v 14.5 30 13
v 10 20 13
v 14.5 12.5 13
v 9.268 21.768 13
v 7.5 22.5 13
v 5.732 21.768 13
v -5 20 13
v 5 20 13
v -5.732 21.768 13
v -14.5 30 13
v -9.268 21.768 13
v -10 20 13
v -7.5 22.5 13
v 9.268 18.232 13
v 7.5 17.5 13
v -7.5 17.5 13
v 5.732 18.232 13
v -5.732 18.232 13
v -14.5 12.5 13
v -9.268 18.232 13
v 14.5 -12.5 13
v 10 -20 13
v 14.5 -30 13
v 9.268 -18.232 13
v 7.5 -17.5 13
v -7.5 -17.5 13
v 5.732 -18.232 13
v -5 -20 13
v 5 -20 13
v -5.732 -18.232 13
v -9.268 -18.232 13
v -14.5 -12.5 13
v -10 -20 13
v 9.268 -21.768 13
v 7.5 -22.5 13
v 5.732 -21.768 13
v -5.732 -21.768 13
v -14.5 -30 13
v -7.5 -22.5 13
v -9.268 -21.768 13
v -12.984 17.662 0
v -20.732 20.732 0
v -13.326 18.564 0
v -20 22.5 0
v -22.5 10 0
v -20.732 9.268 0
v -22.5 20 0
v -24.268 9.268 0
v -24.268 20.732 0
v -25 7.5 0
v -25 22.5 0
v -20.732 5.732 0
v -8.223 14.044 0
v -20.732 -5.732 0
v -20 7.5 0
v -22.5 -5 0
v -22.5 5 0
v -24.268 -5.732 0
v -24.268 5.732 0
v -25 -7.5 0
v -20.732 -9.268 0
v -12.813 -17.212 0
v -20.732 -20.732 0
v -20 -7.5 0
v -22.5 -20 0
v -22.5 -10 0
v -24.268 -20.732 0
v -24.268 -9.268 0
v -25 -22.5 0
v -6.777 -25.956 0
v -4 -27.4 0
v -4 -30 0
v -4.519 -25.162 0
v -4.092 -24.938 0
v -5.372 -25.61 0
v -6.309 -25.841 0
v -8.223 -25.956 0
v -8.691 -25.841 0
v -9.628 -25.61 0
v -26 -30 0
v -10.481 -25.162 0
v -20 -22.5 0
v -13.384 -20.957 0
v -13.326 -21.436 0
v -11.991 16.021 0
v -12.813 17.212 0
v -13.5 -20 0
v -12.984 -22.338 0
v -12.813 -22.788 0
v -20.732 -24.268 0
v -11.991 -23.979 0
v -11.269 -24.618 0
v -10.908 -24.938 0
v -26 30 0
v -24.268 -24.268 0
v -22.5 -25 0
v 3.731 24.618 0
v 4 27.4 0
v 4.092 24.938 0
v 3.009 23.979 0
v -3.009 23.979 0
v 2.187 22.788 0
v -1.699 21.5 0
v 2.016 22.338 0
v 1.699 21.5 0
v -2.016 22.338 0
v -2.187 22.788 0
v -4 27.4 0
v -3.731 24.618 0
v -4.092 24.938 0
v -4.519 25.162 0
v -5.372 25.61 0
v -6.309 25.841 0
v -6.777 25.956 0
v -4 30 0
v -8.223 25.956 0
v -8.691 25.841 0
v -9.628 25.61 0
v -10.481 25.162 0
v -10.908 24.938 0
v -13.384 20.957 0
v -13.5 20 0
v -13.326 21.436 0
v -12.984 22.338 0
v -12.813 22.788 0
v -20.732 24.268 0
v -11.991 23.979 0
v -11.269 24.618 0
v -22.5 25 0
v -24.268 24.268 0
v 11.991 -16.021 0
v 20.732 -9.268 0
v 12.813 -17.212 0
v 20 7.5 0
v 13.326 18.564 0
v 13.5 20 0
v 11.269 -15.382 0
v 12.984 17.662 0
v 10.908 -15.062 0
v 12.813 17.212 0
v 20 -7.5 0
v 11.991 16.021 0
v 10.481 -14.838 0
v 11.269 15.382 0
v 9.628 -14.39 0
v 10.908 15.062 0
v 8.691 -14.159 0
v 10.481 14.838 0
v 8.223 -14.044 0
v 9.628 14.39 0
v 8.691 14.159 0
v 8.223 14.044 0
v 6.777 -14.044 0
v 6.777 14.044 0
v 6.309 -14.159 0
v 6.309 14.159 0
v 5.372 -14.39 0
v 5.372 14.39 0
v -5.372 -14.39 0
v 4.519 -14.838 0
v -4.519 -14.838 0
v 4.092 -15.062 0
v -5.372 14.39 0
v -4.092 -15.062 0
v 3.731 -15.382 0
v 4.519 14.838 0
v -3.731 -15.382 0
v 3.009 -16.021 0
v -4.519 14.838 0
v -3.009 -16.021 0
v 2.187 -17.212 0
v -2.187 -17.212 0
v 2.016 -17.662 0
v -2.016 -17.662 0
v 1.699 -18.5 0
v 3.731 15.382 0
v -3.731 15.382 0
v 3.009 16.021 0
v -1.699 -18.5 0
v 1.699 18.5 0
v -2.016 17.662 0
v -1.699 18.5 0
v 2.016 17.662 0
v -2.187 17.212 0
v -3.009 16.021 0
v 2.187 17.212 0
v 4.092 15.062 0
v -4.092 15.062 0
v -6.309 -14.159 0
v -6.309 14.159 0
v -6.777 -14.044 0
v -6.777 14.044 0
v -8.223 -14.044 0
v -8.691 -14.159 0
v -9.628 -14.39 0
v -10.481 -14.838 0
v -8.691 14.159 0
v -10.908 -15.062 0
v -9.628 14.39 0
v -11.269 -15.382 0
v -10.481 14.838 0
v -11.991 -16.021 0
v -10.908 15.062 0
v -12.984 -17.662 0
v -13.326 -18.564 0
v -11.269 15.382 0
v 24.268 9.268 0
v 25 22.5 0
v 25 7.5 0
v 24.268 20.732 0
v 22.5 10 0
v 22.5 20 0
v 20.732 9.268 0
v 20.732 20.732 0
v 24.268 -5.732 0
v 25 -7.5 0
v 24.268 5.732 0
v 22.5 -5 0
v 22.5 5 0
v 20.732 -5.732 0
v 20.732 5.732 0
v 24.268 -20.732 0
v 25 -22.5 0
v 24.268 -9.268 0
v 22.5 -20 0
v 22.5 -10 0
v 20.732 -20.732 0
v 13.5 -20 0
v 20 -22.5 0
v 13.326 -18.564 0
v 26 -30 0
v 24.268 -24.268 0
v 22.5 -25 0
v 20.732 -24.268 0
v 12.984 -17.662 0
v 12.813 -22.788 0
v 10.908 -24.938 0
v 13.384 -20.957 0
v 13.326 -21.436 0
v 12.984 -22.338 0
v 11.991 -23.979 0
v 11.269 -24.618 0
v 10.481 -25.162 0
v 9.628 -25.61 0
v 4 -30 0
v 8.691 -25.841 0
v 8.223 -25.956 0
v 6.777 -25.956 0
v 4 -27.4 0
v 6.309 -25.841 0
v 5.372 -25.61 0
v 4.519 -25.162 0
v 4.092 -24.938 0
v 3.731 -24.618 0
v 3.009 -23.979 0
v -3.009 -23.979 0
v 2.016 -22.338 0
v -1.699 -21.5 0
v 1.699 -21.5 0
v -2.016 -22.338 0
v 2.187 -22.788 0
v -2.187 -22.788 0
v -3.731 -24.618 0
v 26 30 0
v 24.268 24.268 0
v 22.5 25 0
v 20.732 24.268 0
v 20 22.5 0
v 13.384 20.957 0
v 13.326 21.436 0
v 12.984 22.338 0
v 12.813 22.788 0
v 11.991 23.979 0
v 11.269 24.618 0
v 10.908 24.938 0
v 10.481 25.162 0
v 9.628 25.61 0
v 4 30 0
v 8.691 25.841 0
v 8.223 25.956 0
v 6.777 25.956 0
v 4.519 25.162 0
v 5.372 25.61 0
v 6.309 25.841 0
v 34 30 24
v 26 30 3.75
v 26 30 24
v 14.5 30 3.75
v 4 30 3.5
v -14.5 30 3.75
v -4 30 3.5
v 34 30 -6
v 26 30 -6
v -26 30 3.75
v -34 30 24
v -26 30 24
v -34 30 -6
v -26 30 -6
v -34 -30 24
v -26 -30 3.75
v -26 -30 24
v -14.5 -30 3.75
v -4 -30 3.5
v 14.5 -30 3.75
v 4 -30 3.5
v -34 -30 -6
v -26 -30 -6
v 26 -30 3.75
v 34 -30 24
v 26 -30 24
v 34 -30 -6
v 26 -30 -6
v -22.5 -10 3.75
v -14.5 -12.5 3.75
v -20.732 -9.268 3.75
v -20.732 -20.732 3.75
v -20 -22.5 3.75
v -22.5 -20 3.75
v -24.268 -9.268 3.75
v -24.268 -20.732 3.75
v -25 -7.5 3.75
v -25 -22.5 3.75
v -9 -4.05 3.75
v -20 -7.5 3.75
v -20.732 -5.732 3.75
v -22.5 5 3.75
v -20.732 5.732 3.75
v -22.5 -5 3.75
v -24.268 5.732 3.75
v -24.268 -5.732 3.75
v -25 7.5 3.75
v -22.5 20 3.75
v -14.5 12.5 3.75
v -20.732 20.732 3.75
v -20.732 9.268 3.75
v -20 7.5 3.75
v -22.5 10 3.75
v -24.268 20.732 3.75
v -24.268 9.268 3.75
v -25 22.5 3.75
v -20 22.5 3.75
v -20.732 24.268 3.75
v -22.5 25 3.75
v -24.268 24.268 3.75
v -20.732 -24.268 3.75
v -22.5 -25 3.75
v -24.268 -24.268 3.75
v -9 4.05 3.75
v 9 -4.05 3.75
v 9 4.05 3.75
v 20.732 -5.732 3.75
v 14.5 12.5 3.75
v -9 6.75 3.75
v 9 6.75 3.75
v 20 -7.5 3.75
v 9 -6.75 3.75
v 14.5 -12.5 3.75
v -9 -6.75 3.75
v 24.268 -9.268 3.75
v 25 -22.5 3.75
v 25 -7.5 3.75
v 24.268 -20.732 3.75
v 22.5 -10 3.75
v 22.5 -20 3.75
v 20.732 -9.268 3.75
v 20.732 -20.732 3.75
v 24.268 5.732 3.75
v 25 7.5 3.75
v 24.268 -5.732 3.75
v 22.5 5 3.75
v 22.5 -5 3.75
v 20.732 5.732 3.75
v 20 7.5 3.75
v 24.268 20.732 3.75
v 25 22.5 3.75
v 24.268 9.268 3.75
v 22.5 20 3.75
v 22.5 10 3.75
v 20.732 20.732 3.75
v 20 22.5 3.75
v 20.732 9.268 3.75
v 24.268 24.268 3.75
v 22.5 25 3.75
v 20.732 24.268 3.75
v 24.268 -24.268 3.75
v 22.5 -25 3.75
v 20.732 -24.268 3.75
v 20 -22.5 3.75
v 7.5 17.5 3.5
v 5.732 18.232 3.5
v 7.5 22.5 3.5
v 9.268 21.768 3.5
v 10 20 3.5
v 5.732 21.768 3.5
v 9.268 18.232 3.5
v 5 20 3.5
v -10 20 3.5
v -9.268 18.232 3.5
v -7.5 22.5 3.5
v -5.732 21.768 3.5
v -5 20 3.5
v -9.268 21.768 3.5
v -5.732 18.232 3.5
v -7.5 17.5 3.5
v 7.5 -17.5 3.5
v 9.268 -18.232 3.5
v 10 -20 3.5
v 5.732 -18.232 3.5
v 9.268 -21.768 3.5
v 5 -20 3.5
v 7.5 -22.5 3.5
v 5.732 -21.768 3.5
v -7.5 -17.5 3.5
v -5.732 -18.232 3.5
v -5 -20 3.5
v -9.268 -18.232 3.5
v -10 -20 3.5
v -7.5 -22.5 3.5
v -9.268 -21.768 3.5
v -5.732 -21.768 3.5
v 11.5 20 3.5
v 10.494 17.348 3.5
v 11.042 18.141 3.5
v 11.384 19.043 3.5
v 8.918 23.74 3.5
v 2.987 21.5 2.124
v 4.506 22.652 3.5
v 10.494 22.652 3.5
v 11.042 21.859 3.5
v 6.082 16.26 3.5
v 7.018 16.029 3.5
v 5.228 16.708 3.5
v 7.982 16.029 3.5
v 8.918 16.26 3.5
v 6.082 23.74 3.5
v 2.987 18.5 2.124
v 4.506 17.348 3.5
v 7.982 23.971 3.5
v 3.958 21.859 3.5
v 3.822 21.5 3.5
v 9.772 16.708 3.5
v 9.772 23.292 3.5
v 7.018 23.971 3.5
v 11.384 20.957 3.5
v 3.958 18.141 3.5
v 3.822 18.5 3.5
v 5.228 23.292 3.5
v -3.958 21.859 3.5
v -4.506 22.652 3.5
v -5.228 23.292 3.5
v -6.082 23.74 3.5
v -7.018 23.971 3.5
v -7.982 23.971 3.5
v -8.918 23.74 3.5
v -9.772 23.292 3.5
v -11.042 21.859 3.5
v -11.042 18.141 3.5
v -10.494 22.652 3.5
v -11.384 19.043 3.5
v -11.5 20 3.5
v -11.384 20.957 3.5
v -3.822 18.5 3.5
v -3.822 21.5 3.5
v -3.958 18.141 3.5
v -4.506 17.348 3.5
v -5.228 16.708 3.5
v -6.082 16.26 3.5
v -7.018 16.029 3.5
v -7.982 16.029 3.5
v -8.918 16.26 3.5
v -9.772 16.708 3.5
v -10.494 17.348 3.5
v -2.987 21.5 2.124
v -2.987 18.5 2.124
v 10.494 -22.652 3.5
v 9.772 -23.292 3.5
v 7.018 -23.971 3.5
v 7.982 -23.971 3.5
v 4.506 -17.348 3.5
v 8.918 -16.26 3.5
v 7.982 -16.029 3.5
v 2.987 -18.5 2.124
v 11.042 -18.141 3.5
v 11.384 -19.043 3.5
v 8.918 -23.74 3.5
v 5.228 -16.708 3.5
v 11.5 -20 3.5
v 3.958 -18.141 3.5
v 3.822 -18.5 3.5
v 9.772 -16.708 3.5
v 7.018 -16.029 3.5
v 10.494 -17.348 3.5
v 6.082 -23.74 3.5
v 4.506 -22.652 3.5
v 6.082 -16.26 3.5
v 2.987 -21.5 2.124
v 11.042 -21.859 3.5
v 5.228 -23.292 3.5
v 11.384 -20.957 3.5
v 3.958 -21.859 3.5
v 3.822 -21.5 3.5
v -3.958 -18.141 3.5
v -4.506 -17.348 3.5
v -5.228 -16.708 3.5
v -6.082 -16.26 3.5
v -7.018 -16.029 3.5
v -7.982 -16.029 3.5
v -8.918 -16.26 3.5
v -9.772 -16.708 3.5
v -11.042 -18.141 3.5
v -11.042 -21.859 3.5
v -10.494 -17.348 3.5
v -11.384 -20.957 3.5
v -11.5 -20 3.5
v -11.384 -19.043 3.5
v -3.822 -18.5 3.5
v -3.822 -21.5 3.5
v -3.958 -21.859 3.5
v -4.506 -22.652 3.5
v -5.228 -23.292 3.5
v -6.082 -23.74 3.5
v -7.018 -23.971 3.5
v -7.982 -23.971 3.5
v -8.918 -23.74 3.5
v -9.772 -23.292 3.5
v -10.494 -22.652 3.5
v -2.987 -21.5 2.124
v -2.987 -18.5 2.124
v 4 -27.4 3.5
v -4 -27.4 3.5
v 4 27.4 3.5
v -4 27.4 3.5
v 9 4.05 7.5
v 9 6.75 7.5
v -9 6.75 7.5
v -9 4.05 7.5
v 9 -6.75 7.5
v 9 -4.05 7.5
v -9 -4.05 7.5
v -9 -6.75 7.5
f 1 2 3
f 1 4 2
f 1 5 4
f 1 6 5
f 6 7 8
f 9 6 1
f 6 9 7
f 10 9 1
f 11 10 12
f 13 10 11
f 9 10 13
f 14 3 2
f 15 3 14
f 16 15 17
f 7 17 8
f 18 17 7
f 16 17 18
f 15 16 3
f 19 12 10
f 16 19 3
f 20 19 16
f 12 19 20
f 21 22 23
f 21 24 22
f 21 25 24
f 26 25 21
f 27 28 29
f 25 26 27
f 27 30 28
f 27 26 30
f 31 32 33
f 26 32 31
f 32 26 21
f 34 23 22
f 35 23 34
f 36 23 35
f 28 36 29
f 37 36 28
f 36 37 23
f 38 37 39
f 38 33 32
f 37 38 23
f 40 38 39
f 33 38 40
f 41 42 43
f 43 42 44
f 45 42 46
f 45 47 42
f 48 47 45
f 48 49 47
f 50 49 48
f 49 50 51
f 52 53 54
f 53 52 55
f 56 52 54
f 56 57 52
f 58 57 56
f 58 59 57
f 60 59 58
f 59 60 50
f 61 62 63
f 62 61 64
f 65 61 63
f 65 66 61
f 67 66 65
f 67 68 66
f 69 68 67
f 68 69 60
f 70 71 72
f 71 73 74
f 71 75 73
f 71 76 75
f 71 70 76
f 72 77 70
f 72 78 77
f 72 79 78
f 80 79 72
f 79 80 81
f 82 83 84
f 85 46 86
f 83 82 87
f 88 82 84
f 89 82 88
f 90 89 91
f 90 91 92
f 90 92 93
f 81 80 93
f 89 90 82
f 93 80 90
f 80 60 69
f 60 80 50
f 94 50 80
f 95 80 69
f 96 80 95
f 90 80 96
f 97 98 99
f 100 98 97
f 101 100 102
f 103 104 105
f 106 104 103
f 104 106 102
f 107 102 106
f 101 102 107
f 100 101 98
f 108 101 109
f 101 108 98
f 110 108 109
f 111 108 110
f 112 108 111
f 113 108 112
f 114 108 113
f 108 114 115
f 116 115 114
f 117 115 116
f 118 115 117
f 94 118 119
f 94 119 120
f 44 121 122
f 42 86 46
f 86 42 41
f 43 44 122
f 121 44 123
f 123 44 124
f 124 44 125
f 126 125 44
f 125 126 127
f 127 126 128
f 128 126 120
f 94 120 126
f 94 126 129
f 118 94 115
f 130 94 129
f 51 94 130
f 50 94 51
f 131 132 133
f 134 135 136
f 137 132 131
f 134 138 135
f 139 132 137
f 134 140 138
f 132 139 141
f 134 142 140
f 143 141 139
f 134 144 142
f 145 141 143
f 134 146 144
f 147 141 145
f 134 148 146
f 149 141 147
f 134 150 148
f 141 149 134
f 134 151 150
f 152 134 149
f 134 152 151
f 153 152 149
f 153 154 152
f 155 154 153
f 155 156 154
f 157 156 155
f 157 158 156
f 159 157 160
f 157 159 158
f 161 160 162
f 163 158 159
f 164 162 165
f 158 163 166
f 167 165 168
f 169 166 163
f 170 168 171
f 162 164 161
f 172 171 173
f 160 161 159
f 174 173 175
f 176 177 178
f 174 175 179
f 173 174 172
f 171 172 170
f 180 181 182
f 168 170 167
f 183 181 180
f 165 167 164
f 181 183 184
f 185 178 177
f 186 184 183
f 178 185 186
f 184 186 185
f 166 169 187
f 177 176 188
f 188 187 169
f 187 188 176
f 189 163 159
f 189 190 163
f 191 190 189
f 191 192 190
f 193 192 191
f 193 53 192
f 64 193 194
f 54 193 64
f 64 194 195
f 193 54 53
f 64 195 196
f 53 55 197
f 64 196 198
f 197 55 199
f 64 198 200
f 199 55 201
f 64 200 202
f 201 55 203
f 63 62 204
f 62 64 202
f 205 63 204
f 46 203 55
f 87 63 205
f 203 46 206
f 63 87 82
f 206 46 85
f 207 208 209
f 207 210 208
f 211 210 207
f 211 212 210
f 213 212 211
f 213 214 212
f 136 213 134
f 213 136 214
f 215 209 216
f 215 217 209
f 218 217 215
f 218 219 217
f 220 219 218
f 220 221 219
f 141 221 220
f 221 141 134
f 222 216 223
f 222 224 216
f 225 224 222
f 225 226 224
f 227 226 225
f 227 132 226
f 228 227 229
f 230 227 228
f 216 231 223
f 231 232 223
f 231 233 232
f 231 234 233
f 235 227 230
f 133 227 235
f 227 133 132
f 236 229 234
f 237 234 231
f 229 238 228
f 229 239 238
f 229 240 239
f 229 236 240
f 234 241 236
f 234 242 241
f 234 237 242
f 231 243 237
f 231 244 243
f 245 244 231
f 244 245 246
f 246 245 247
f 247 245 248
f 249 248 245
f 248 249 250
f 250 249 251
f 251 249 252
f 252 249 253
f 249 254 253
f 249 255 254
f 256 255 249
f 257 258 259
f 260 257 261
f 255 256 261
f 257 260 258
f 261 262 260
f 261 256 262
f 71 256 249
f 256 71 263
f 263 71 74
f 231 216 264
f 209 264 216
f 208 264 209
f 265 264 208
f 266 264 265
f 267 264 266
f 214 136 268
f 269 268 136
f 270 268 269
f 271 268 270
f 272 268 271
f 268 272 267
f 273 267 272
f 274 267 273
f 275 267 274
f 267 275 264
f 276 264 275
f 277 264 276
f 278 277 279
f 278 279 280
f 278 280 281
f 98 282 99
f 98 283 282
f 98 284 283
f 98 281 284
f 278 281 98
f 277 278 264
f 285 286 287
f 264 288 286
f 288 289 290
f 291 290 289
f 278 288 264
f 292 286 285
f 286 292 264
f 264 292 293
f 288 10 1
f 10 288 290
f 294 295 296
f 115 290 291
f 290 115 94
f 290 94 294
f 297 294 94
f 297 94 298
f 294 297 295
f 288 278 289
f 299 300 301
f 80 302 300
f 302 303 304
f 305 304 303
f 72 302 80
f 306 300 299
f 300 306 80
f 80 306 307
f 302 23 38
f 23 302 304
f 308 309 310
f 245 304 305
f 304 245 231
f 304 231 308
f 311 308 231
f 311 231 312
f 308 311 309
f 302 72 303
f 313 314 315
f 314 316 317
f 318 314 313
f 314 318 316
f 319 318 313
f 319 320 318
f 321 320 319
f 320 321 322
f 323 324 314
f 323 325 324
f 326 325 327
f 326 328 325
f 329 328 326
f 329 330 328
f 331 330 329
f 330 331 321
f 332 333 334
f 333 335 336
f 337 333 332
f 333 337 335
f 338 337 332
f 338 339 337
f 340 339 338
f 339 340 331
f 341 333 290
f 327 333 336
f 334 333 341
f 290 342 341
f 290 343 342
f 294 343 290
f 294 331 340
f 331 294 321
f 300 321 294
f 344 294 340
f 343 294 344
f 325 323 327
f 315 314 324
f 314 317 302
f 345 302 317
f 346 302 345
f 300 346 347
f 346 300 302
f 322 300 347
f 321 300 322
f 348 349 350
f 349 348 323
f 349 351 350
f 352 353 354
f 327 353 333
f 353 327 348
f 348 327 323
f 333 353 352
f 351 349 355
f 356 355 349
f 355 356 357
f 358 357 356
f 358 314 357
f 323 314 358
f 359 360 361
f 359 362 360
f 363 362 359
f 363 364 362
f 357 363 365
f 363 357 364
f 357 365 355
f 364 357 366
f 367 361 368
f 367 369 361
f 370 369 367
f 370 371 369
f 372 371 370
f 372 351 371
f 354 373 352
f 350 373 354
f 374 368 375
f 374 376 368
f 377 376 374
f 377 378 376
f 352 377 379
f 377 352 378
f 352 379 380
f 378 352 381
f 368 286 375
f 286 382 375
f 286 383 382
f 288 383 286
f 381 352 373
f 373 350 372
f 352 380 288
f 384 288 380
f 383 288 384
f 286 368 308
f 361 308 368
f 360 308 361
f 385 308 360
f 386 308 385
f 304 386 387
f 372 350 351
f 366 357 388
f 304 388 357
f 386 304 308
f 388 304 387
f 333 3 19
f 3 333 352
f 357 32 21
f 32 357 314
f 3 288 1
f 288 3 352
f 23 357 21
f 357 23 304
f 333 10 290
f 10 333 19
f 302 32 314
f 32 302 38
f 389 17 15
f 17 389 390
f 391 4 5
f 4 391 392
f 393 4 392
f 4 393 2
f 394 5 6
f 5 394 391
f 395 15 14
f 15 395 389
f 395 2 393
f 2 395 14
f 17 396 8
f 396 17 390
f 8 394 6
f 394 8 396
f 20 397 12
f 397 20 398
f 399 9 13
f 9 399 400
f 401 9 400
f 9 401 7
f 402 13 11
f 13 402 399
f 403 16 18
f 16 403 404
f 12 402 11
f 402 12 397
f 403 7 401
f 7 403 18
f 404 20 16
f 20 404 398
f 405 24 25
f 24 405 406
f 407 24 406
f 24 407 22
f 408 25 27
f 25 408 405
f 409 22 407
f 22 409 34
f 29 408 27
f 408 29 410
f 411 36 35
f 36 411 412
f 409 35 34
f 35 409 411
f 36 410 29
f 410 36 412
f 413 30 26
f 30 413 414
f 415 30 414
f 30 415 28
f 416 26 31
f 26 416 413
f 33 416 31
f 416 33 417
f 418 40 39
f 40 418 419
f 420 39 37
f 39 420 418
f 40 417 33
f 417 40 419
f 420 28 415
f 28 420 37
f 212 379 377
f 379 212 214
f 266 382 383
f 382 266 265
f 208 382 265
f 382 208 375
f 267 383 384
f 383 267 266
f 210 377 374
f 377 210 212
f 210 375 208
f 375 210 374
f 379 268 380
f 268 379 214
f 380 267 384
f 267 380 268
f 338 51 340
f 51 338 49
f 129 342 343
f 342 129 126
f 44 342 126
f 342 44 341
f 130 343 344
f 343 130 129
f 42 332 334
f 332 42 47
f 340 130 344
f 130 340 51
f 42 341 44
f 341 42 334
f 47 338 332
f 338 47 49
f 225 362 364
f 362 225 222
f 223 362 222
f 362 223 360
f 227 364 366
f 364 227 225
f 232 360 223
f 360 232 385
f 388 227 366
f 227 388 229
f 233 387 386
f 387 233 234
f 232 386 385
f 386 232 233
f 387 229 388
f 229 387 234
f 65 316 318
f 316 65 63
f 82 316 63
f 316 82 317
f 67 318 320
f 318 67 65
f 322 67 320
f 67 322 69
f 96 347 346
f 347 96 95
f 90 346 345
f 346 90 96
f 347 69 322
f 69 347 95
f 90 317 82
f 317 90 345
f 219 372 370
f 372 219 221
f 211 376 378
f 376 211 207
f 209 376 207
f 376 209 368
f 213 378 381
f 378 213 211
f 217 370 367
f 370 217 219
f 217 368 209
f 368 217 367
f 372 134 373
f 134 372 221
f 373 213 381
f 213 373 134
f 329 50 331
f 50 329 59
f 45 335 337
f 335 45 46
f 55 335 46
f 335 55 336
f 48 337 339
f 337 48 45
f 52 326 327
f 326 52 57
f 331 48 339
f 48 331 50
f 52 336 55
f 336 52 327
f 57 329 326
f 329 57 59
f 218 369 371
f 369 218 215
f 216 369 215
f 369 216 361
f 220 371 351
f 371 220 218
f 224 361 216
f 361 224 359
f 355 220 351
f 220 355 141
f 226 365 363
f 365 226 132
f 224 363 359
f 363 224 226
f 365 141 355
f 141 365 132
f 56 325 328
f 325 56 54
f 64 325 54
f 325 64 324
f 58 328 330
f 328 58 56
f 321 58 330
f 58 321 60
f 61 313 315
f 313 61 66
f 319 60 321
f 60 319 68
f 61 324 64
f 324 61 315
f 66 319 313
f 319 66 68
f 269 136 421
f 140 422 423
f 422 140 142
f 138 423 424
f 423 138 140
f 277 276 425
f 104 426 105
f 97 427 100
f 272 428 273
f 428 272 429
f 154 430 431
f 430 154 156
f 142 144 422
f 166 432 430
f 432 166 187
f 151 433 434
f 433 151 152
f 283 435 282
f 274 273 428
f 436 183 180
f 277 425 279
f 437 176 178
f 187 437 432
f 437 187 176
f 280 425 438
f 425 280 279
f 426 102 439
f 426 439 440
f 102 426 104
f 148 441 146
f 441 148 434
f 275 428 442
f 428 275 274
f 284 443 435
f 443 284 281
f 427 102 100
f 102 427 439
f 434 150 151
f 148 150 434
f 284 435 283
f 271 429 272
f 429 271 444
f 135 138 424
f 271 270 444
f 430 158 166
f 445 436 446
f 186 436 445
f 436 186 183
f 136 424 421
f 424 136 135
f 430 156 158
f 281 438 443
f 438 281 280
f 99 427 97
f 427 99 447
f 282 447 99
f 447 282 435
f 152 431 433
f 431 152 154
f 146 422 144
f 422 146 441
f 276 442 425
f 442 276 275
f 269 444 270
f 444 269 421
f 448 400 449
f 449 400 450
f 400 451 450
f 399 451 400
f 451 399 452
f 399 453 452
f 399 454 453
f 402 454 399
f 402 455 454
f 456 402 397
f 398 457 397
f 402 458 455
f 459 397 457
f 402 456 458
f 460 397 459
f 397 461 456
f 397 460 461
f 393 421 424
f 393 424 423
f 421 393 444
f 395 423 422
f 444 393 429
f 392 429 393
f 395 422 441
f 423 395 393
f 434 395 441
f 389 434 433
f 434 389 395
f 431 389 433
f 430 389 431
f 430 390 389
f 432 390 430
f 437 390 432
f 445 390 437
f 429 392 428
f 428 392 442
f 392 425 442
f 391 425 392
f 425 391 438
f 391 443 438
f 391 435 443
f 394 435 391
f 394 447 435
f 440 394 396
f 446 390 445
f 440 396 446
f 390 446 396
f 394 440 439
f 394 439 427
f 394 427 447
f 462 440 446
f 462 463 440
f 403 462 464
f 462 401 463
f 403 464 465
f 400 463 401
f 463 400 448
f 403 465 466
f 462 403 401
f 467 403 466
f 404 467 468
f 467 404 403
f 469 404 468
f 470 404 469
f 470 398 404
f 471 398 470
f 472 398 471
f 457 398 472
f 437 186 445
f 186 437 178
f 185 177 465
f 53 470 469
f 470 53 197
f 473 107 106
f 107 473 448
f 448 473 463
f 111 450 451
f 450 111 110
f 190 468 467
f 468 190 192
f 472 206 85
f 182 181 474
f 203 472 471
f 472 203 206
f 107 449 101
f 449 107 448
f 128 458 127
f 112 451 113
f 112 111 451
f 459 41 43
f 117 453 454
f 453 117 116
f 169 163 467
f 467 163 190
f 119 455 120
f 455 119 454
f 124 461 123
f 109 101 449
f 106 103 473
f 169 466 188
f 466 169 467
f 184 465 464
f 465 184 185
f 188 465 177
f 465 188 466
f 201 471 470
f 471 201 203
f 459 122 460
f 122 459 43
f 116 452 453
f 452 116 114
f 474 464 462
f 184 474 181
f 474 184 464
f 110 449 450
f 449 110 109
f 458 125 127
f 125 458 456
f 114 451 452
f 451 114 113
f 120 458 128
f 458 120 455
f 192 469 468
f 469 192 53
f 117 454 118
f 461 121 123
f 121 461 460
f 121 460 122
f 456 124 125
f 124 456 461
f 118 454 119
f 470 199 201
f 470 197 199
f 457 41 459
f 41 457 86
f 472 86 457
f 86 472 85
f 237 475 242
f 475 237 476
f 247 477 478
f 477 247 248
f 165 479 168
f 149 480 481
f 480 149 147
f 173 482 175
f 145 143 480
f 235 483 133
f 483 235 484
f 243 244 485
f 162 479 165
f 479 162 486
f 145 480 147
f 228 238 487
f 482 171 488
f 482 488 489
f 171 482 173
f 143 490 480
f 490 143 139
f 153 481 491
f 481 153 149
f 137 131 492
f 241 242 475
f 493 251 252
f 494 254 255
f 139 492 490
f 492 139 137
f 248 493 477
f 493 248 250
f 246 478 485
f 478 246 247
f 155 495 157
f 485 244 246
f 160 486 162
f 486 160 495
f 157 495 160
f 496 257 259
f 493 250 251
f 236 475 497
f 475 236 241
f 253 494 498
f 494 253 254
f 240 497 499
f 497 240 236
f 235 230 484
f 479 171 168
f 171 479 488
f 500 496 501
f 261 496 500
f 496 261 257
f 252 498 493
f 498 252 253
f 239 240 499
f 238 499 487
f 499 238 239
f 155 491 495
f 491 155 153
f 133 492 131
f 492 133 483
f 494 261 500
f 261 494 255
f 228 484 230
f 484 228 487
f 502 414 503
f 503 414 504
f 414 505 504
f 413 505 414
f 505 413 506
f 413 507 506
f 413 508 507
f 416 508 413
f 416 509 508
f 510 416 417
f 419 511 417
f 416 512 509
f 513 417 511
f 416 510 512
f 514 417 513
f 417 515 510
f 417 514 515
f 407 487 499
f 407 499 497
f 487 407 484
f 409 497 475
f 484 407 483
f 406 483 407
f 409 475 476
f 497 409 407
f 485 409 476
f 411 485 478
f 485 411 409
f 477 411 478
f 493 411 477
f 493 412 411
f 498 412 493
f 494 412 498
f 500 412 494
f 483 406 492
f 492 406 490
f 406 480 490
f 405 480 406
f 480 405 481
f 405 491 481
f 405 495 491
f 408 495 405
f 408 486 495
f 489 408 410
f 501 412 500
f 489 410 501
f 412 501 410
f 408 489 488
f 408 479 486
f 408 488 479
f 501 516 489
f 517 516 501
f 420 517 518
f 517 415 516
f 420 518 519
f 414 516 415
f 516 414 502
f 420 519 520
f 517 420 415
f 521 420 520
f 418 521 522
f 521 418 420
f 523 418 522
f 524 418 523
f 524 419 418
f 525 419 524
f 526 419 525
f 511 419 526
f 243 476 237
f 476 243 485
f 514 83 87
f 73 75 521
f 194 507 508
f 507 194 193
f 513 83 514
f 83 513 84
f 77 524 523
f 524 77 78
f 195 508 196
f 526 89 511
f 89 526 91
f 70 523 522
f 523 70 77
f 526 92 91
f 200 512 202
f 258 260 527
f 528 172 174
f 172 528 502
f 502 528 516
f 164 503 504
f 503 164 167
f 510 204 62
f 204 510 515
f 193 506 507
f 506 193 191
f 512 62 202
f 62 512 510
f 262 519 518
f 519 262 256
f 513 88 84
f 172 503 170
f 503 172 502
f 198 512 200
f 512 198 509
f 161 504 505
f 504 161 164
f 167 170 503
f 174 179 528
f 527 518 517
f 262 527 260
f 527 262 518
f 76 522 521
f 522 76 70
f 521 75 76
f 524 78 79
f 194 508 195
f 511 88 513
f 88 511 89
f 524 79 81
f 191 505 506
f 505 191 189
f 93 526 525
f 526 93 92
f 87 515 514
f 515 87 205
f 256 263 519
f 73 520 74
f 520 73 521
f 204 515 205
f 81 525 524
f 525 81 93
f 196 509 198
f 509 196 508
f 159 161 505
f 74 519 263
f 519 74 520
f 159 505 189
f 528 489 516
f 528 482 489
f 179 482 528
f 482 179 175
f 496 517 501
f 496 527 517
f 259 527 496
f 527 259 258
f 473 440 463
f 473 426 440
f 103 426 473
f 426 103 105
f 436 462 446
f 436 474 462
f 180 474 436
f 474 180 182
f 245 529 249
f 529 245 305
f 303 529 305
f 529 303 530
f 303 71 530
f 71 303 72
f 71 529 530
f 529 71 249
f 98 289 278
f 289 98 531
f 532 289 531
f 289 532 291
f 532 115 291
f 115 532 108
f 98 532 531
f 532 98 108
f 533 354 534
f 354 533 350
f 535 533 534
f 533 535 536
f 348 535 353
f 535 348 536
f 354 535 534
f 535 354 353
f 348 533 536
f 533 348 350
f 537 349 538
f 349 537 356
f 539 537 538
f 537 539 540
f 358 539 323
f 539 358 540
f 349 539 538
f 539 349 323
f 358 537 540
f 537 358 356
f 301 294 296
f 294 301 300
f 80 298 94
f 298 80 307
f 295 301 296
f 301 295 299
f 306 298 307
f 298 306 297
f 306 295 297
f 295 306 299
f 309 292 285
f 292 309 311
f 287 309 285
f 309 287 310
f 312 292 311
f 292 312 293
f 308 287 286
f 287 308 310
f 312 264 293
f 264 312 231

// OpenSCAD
//block shape
x=60;
y=60;
z=13;

// track channel
f=x+10;
g=25;
h=9.5;
// block top
e=20;
r=y+10;
t=16.5;

// spacing of screw holes
cx=15;
cy=40;
dx=15;
dy=45;


difference()
{
    translate([0,0,z]/2) cube ([x,y,z],center=true);
    translate([0,0,z+4]/2) cube([f,g,h],center=true);
    translate([49,0,z+11]/2) cube ([e,r,t],center=true);
        translate([-49,0,z+11]/2) cube ([e,r,t],center=true);

  translate([cx,cy,0]/2) cylinder(d=5, h=50,  center=true);
  translate([-cx,cy,0]/2) cylinder(d=5, h=50,  center=true);
    translate([cx,-cy,0]/2) cylinder(d=5, h=50,  center=true);
    translate([-cx,-cy,0]/2) cylinder(d=5, h=50,  center=true);
  translate([dy,dy,0]/2) cylinder(d=5, h=50,  center=true);
  translate([-dy,dy,0]/2) cylinder(d=5, h=50,  center=true);
    translate([dy,-dy,0]/2) cylinder(d=5, h=50,  center=true);
    translate([-dy,-dy,0]/2) cylinder(d=5, h=50,  center=true);  
    translate([dy,dx,0]/2) cylinder(d=5, h=50,  center=true);
  translate([-dy,dx,0]/2) cylinder(d=5, h=50,  center=true);  
  translate([dy,-dx,0]/2) cylinder(d=5, h=50,  center=true);
  translate([-dy,-dx,0]/2) cylinder(d=5, h=50,  center=true);  
    
 translate([cx,cy,0]/2)  cylinder(d1=16, d2=8, h=7,  center=true);
 translate([-cx,cy,0]/2) cylinder(d1=16, d2=8, h=7, center=true);
    translate([cx,-cy,0]/2) cylinder(d1=16, d2=8, h=7,  center=true);
    translate([-cx,-cy,0]/2) cylinder(d1=16, d2=8, h=7,  center=true);    
// zip tie knotches    
    translate([0,-cy/2,11.5-10]) cube([18,3,4],center=true);
    translate([0,cy/2,11.5-10]) cube([18,3,4],center=true);
// removal knotches
       translate([0,-(6.8+51)/2,11.5-10]) cube([8,3,4],center=true);
   translate([0,(6.8+51)/2,11.5-10]) cube([8,3,4],center=true);
   translate([(6.8+51)/2,0,11.5-11]) cube([3,8,2],center=true);
   translate([-(6.8+51)/2,0,11.5-11]) cube([3,8,2],center=true);
}

translate([0,(6.8+4)/2,z-8]) cube([18,2.7,5],center=true);
translate([0,-(6.8+4)/2,z-8]) cube([18,2.7,5],center=true);

difference ()
{
    translate([-30,0,9]) cube([8,60,30],center=true);
    
    
}

difference ()
{
    translate([30,0,9]) cube([8,60,30],center=true);
    
    
}
